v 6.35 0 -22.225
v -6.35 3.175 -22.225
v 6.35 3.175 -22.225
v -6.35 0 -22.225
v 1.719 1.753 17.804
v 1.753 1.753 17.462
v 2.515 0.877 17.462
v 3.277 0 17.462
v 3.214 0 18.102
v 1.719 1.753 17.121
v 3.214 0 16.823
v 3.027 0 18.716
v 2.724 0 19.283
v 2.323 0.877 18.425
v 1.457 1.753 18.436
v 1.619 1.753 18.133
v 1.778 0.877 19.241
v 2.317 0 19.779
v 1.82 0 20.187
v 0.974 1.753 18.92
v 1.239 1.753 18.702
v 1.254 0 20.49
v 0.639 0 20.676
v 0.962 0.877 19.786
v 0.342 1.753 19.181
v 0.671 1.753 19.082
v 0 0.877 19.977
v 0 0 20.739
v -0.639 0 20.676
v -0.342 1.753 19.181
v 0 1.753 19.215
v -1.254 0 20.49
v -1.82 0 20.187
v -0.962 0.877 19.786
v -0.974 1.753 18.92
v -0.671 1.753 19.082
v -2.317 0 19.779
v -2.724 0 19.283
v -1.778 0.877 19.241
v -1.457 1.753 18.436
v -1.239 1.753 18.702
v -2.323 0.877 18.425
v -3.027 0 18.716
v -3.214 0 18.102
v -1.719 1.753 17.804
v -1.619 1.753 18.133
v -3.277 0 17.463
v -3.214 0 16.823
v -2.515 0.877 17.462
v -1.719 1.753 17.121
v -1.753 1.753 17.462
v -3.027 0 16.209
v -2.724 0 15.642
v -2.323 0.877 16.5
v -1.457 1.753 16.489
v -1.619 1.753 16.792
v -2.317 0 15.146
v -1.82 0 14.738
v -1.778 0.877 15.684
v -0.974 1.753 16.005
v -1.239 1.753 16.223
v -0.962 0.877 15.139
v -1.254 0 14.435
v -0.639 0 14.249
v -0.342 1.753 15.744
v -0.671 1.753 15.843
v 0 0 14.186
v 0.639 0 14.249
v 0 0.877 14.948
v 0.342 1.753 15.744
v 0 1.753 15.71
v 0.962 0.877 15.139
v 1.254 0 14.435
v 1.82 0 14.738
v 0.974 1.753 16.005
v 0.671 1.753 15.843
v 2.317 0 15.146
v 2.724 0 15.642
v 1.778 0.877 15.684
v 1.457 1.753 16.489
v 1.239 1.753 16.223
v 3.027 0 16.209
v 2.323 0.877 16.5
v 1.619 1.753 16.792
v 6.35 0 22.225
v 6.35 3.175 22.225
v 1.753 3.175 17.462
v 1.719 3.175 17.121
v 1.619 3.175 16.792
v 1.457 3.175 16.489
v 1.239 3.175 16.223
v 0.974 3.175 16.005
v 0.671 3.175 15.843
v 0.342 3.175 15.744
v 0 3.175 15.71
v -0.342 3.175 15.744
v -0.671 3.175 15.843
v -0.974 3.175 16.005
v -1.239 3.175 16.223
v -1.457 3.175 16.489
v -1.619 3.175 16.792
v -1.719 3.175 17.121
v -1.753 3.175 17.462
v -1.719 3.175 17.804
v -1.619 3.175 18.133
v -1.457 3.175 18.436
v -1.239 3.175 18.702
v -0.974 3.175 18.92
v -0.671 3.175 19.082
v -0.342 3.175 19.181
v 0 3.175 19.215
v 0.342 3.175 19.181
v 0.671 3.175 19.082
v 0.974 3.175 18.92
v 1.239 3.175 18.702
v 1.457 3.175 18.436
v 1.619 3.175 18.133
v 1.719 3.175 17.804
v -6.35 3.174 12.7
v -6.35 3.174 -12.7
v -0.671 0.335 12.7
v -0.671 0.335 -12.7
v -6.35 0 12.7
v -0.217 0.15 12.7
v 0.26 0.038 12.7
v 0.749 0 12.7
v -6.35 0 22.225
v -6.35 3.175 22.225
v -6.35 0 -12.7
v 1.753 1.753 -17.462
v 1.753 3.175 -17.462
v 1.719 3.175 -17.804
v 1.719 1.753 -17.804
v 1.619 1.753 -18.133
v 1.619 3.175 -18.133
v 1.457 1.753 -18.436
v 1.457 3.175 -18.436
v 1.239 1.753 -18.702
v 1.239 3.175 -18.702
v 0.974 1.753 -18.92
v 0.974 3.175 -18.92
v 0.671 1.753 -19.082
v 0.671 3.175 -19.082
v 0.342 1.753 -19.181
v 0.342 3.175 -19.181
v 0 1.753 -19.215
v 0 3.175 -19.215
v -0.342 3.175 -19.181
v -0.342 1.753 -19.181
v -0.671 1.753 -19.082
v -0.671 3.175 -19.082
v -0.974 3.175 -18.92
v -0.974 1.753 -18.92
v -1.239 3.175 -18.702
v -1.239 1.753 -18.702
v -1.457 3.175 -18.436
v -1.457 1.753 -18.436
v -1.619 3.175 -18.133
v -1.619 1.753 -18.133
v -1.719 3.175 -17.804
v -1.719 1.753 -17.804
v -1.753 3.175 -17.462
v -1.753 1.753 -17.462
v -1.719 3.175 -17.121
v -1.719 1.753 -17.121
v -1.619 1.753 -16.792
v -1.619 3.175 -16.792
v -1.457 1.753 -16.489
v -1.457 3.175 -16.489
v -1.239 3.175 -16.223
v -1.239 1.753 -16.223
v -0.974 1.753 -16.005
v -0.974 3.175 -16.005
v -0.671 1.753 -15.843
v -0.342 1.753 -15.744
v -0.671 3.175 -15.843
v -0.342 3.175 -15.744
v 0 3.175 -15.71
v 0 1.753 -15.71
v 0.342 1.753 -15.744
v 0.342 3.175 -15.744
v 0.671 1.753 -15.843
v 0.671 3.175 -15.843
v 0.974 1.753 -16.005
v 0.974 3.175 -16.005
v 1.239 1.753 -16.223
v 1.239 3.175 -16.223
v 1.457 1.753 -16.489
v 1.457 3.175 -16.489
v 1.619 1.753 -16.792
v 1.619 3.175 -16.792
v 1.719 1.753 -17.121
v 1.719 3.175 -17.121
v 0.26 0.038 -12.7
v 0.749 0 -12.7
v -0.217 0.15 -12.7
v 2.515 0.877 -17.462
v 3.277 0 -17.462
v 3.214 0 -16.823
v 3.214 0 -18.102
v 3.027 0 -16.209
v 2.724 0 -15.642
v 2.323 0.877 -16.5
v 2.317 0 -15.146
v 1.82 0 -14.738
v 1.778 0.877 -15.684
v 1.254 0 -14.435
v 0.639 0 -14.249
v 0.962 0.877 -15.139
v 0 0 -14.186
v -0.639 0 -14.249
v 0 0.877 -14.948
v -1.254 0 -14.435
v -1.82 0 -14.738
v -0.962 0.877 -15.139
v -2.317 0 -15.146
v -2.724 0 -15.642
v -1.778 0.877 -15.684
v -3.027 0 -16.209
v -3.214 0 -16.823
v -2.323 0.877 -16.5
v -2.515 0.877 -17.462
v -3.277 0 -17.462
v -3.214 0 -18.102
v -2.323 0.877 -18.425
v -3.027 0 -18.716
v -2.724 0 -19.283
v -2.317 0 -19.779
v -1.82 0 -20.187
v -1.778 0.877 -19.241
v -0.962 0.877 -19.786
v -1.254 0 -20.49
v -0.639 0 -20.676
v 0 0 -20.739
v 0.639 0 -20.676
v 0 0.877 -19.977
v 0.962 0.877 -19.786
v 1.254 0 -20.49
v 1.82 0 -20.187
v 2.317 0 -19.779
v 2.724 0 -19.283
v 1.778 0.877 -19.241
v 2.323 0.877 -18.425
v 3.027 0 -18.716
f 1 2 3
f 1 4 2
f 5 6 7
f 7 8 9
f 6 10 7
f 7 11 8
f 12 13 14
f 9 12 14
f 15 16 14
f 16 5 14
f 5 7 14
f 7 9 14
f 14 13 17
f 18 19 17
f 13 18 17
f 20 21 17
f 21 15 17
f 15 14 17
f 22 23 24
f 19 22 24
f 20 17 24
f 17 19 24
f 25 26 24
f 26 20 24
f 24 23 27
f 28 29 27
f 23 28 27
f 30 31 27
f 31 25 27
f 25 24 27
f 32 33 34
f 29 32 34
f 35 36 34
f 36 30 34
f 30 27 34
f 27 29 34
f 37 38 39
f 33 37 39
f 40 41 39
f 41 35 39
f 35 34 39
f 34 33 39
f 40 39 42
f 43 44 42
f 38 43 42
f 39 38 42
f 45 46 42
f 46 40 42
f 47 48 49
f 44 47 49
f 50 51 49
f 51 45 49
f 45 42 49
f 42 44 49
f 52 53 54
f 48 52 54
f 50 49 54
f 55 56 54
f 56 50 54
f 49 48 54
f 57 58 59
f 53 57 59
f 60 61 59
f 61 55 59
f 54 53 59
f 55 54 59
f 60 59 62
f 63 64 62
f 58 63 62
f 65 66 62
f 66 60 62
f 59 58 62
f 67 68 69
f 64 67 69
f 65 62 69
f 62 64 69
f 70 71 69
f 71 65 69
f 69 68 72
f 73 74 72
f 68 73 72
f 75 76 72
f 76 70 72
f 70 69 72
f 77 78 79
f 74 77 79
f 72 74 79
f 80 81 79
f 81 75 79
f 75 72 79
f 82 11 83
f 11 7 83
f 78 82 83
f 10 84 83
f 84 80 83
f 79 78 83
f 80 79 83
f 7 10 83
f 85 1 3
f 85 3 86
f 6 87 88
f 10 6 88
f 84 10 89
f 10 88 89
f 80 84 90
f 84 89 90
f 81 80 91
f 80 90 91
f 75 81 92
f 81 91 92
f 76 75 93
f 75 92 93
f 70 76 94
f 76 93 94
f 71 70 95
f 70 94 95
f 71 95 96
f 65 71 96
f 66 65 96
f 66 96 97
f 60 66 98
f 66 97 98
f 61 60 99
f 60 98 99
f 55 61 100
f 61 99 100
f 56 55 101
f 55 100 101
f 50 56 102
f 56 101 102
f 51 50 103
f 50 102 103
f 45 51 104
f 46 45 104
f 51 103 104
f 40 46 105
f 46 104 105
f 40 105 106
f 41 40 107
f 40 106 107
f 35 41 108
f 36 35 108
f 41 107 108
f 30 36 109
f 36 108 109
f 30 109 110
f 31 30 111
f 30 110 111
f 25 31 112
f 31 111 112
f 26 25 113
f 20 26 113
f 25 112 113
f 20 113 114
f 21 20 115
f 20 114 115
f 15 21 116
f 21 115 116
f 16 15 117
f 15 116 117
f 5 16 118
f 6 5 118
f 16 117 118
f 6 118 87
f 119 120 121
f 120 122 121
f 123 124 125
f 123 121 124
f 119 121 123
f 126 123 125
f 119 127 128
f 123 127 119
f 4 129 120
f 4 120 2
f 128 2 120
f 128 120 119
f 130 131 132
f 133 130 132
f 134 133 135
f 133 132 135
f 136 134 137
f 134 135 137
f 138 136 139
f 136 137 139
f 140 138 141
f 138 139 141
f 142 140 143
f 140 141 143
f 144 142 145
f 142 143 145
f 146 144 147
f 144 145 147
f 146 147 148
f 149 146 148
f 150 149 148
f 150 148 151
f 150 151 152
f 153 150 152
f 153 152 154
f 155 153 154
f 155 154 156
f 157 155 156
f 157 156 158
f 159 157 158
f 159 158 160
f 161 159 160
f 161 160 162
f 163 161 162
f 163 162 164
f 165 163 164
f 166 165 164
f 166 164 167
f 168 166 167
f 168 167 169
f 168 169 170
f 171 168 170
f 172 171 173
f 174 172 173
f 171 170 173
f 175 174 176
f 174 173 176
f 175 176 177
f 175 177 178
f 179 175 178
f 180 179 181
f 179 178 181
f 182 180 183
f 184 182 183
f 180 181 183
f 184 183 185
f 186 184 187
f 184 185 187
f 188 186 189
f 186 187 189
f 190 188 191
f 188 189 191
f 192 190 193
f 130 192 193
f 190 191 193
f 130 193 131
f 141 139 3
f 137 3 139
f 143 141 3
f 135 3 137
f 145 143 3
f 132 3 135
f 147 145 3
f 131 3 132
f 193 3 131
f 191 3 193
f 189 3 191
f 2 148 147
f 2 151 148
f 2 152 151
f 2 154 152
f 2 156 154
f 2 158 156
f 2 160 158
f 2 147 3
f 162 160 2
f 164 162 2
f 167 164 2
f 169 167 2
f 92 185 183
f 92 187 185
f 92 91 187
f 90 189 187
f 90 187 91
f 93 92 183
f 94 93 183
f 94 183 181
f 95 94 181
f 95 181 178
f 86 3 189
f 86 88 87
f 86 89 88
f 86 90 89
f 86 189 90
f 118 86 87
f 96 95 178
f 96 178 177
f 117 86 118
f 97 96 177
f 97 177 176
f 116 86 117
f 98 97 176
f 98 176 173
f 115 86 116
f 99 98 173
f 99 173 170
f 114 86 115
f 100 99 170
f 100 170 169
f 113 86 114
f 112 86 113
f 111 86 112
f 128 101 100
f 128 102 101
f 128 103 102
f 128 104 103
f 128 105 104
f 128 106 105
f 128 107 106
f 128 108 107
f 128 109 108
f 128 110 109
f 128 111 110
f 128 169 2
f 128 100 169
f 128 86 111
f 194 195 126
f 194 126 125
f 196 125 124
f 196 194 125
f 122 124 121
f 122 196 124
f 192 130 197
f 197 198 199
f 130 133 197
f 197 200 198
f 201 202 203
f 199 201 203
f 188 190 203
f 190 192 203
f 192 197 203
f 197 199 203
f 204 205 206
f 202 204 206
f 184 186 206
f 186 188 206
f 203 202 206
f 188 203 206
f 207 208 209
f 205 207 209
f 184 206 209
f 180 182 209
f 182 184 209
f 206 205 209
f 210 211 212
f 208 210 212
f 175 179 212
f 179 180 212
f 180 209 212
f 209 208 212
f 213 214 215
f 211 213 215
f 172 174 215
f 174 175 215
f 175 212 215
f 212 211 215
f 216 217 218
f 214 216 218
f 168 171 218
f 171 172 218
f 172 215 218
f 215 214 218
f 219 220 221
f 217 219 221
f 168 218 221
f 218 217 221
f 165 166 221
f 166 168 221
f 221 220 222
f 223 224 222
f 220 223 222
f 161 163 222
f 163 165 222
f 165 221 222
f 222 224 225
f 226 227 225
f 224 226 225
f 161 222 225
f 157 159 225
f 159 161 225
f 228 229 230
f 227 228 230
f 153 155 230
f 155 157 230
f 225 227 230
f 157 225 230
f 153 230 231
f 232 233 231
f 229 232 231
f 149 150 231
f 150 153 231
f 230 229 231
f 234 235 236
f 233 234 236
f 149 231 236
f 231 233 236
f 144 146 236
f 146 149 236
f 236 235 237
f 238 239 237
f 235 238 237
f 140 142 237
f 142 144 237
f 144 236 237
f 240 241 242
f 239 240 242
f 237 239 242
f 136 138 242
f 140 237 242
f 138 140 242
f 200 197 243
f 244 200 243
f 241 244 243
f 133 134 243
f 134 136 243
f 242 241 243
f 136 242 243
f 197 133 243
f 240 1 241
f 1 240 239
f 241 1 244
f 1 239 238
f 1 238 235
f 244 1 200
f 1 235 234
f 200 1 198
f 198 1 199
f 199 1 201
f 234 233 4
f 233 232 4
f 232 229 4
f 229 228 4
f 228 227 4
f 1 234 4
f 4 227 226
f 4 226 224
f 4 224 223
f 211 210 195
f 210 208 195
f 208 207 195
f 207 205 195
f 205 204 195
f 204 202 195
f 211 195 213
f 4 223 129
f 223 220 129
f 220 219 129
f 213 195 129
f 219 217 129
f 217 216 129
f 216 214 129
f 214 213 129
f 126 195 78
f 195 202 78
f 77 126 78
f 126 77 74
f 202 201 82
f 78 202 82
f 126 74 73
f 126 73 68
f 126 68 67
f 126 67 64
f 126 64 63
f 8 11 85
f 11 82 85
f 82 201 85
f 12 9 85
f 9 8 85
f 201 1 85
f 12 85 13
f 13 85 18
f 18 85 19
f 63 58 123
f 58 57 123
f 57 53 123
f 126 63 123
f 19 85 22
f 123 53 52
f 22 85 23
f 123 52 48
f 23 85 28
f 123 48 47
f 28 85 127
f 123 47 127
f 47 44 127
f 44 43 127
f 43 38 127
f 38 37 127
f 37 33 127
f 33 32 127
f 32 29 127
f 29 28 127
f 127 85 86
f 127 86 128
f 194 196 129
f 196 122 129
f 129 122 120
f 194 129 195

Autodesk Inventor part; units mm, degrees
ref_plane "YZ Plane" through (0, 0, 0) normal (1, 0, 0) x (0, 1, 0)
ref_plane "XZ Plane" through (0, 0, 0) normal (0, 1, 0) x (-1, 0, 0)
ref_plane "XY Plane" through (0, 0, 0) normal (0, 0, 1) x (1, 0, 0)
sketch "Sketch1" plane through (0, 0, 0) normal (0, 1, 0) x (-1, 0, 0)
  line L0 (-6.35, 22.225) -> (6.35, 22.225)
  line L1 (6.35, 22.225) -> (6.35, -22.225)
  line L2 (6.35, -22.225) -> (-6.35, -22.225)
  line L3 (-6.35, -22.225) -> (-6.35, 22.225)
  line L4 (-6.35, 22.225) -> (6.35, -22.225) construction
  line L5 (6.35, 22.225) -> (-6.35, -22.225) construction
  line L6 (-4.7625, 9.525) -> (4.7625, 9.525) construction
  line L7 (4.7625, 9.525) -> (4.7625, -9.525) construction
  line L8 (4.7625, -9.525) -> (-4.7625, -9.525) construction
  line L9 (-4.7625, -9.525) -> (-4.7625, 9.525) construction
  line L10 (-4.7625, 9.525) -> (4.7625, -9.525) construction
  line L11 (4.7625, 9.525) -> (-4.7625, -9.525) construction
  point P0 (0, 0)
  dimension "d0" = 12.7
  dimension "d1" = 44.45
  dimension "d2" = 9.525
  dimension "d3" = 19.05
extrude "Extrusion1" add sketch "Sketch1" along normal blind 3.175
chamfer "Chamfer1" distance 3.175 distance2 6.35 1 edges at (-6.35, 0, 0) measured on face at (-6.35, 1.0583, -7.4083)
fillet "Fillet1" radius 3.175 1 edges at (-0.0005, 0, 0)
sketch "Sketch2" plane through (0, 3.175, 0) normal (0, 1, 0) x (1, 0, 0)
  line L0 (0, -17.4625) -> (0, -17.4625) construction
  line L1 (0, -17.4625) -> (0, 17.4625) construction
  line L2 (0, 17.4625) -> (0, 17.4625) construction
  line L3 (0, 17.4625) -> (0, -17.4625) construction
  line L4 (0, -17.4625) -> (0, 17.4625) construction
  line L5 (0, -17.4625) -> (0, 17.4625) construction
  circle A0 centre (0, -17.4625) radius 1.7526
  circle A1 centre (0, 17.4625) radius 1.7526
  circle A2 centre (0, -17.4625) radius 1.7526
  circle A3 centre (0, 17.4625) radius 1.7526
  line L6 (6.35, 12.7) -> (-6.35, 12.7)
  line L7 (-6.35, 12.7) -> (-6.35, 22.225)
  line L8 (-6.35, 22.225) -> (6.35, 22.225)
  line L9 (6.35, 22.225) -> (6.35, 12.7)
  line L10 (6.35, 12.7) -> (-6.35, 22.225) construction
  line L11 (-6.35, 12.7) -> (6.35, 22.225) construction
  line L12 (-6.35, 22.225) -> (-6.35, -22.225) projected
  line L13 (-6.35, 0) -> (6.35, 0) construction
  line L14 (6.35, -22.225) -> (6.35, 22.225) projected
  line L15 (6.35, -12.7) -> (-6.35, -12.7)
  line L16 (-6.35, -12.7) -> (-6.35, -22.225)
  line L17 (-6.35, -22.225) -> (6.35, -22.225)
  line L18 (6.35, -22.225) -> (6.35, -12.7)
  line L19 (6.35, -12.7) -> (-6.35, -22.225) construction
  line L20 (-6.35, -12.7) -> (6.35, -22.225) construction
  point P0 (0, 0)
  point P1 (0, 17.4625)
  point P2 (0, -17.4625)
  point P3 (0, -17.4625)
  point P4 (0, -17.4625)
  point P5 (6.35, -12.7)
  point P6 (-6.35, -12.7)
  point P7 (-6.35, -22.225)
  dimension "d10" = 0
  dimension "d11" = 34.925
  dimension "d12" = 3.5052
  dimension "d15" = 34.925
  dimension "d18" = 0
  dimension "d21" = 12.7
  dimension "d22" = 9.525
extrude "Extrusion2" add sketch "Sketch2" against normal up to surface (3.175 mm away) contours A0 | A1 | L6 L7 L8 L9 | L14 L17 L12 L15
extrude "Extrusion3" cut sketch "Sketch2" against normal through all contours A0 | A1
chamfer "Chamfer2" distance 1.524 angle 49 2 edges at (-1.7526, 0, 17.4625) (-1.7526, 0, -17.4625) measured on face at (4.483, 0, 4.2333)
equation "\"d15\" = d11"
properties part number "ramp" material "UHMW, White"
